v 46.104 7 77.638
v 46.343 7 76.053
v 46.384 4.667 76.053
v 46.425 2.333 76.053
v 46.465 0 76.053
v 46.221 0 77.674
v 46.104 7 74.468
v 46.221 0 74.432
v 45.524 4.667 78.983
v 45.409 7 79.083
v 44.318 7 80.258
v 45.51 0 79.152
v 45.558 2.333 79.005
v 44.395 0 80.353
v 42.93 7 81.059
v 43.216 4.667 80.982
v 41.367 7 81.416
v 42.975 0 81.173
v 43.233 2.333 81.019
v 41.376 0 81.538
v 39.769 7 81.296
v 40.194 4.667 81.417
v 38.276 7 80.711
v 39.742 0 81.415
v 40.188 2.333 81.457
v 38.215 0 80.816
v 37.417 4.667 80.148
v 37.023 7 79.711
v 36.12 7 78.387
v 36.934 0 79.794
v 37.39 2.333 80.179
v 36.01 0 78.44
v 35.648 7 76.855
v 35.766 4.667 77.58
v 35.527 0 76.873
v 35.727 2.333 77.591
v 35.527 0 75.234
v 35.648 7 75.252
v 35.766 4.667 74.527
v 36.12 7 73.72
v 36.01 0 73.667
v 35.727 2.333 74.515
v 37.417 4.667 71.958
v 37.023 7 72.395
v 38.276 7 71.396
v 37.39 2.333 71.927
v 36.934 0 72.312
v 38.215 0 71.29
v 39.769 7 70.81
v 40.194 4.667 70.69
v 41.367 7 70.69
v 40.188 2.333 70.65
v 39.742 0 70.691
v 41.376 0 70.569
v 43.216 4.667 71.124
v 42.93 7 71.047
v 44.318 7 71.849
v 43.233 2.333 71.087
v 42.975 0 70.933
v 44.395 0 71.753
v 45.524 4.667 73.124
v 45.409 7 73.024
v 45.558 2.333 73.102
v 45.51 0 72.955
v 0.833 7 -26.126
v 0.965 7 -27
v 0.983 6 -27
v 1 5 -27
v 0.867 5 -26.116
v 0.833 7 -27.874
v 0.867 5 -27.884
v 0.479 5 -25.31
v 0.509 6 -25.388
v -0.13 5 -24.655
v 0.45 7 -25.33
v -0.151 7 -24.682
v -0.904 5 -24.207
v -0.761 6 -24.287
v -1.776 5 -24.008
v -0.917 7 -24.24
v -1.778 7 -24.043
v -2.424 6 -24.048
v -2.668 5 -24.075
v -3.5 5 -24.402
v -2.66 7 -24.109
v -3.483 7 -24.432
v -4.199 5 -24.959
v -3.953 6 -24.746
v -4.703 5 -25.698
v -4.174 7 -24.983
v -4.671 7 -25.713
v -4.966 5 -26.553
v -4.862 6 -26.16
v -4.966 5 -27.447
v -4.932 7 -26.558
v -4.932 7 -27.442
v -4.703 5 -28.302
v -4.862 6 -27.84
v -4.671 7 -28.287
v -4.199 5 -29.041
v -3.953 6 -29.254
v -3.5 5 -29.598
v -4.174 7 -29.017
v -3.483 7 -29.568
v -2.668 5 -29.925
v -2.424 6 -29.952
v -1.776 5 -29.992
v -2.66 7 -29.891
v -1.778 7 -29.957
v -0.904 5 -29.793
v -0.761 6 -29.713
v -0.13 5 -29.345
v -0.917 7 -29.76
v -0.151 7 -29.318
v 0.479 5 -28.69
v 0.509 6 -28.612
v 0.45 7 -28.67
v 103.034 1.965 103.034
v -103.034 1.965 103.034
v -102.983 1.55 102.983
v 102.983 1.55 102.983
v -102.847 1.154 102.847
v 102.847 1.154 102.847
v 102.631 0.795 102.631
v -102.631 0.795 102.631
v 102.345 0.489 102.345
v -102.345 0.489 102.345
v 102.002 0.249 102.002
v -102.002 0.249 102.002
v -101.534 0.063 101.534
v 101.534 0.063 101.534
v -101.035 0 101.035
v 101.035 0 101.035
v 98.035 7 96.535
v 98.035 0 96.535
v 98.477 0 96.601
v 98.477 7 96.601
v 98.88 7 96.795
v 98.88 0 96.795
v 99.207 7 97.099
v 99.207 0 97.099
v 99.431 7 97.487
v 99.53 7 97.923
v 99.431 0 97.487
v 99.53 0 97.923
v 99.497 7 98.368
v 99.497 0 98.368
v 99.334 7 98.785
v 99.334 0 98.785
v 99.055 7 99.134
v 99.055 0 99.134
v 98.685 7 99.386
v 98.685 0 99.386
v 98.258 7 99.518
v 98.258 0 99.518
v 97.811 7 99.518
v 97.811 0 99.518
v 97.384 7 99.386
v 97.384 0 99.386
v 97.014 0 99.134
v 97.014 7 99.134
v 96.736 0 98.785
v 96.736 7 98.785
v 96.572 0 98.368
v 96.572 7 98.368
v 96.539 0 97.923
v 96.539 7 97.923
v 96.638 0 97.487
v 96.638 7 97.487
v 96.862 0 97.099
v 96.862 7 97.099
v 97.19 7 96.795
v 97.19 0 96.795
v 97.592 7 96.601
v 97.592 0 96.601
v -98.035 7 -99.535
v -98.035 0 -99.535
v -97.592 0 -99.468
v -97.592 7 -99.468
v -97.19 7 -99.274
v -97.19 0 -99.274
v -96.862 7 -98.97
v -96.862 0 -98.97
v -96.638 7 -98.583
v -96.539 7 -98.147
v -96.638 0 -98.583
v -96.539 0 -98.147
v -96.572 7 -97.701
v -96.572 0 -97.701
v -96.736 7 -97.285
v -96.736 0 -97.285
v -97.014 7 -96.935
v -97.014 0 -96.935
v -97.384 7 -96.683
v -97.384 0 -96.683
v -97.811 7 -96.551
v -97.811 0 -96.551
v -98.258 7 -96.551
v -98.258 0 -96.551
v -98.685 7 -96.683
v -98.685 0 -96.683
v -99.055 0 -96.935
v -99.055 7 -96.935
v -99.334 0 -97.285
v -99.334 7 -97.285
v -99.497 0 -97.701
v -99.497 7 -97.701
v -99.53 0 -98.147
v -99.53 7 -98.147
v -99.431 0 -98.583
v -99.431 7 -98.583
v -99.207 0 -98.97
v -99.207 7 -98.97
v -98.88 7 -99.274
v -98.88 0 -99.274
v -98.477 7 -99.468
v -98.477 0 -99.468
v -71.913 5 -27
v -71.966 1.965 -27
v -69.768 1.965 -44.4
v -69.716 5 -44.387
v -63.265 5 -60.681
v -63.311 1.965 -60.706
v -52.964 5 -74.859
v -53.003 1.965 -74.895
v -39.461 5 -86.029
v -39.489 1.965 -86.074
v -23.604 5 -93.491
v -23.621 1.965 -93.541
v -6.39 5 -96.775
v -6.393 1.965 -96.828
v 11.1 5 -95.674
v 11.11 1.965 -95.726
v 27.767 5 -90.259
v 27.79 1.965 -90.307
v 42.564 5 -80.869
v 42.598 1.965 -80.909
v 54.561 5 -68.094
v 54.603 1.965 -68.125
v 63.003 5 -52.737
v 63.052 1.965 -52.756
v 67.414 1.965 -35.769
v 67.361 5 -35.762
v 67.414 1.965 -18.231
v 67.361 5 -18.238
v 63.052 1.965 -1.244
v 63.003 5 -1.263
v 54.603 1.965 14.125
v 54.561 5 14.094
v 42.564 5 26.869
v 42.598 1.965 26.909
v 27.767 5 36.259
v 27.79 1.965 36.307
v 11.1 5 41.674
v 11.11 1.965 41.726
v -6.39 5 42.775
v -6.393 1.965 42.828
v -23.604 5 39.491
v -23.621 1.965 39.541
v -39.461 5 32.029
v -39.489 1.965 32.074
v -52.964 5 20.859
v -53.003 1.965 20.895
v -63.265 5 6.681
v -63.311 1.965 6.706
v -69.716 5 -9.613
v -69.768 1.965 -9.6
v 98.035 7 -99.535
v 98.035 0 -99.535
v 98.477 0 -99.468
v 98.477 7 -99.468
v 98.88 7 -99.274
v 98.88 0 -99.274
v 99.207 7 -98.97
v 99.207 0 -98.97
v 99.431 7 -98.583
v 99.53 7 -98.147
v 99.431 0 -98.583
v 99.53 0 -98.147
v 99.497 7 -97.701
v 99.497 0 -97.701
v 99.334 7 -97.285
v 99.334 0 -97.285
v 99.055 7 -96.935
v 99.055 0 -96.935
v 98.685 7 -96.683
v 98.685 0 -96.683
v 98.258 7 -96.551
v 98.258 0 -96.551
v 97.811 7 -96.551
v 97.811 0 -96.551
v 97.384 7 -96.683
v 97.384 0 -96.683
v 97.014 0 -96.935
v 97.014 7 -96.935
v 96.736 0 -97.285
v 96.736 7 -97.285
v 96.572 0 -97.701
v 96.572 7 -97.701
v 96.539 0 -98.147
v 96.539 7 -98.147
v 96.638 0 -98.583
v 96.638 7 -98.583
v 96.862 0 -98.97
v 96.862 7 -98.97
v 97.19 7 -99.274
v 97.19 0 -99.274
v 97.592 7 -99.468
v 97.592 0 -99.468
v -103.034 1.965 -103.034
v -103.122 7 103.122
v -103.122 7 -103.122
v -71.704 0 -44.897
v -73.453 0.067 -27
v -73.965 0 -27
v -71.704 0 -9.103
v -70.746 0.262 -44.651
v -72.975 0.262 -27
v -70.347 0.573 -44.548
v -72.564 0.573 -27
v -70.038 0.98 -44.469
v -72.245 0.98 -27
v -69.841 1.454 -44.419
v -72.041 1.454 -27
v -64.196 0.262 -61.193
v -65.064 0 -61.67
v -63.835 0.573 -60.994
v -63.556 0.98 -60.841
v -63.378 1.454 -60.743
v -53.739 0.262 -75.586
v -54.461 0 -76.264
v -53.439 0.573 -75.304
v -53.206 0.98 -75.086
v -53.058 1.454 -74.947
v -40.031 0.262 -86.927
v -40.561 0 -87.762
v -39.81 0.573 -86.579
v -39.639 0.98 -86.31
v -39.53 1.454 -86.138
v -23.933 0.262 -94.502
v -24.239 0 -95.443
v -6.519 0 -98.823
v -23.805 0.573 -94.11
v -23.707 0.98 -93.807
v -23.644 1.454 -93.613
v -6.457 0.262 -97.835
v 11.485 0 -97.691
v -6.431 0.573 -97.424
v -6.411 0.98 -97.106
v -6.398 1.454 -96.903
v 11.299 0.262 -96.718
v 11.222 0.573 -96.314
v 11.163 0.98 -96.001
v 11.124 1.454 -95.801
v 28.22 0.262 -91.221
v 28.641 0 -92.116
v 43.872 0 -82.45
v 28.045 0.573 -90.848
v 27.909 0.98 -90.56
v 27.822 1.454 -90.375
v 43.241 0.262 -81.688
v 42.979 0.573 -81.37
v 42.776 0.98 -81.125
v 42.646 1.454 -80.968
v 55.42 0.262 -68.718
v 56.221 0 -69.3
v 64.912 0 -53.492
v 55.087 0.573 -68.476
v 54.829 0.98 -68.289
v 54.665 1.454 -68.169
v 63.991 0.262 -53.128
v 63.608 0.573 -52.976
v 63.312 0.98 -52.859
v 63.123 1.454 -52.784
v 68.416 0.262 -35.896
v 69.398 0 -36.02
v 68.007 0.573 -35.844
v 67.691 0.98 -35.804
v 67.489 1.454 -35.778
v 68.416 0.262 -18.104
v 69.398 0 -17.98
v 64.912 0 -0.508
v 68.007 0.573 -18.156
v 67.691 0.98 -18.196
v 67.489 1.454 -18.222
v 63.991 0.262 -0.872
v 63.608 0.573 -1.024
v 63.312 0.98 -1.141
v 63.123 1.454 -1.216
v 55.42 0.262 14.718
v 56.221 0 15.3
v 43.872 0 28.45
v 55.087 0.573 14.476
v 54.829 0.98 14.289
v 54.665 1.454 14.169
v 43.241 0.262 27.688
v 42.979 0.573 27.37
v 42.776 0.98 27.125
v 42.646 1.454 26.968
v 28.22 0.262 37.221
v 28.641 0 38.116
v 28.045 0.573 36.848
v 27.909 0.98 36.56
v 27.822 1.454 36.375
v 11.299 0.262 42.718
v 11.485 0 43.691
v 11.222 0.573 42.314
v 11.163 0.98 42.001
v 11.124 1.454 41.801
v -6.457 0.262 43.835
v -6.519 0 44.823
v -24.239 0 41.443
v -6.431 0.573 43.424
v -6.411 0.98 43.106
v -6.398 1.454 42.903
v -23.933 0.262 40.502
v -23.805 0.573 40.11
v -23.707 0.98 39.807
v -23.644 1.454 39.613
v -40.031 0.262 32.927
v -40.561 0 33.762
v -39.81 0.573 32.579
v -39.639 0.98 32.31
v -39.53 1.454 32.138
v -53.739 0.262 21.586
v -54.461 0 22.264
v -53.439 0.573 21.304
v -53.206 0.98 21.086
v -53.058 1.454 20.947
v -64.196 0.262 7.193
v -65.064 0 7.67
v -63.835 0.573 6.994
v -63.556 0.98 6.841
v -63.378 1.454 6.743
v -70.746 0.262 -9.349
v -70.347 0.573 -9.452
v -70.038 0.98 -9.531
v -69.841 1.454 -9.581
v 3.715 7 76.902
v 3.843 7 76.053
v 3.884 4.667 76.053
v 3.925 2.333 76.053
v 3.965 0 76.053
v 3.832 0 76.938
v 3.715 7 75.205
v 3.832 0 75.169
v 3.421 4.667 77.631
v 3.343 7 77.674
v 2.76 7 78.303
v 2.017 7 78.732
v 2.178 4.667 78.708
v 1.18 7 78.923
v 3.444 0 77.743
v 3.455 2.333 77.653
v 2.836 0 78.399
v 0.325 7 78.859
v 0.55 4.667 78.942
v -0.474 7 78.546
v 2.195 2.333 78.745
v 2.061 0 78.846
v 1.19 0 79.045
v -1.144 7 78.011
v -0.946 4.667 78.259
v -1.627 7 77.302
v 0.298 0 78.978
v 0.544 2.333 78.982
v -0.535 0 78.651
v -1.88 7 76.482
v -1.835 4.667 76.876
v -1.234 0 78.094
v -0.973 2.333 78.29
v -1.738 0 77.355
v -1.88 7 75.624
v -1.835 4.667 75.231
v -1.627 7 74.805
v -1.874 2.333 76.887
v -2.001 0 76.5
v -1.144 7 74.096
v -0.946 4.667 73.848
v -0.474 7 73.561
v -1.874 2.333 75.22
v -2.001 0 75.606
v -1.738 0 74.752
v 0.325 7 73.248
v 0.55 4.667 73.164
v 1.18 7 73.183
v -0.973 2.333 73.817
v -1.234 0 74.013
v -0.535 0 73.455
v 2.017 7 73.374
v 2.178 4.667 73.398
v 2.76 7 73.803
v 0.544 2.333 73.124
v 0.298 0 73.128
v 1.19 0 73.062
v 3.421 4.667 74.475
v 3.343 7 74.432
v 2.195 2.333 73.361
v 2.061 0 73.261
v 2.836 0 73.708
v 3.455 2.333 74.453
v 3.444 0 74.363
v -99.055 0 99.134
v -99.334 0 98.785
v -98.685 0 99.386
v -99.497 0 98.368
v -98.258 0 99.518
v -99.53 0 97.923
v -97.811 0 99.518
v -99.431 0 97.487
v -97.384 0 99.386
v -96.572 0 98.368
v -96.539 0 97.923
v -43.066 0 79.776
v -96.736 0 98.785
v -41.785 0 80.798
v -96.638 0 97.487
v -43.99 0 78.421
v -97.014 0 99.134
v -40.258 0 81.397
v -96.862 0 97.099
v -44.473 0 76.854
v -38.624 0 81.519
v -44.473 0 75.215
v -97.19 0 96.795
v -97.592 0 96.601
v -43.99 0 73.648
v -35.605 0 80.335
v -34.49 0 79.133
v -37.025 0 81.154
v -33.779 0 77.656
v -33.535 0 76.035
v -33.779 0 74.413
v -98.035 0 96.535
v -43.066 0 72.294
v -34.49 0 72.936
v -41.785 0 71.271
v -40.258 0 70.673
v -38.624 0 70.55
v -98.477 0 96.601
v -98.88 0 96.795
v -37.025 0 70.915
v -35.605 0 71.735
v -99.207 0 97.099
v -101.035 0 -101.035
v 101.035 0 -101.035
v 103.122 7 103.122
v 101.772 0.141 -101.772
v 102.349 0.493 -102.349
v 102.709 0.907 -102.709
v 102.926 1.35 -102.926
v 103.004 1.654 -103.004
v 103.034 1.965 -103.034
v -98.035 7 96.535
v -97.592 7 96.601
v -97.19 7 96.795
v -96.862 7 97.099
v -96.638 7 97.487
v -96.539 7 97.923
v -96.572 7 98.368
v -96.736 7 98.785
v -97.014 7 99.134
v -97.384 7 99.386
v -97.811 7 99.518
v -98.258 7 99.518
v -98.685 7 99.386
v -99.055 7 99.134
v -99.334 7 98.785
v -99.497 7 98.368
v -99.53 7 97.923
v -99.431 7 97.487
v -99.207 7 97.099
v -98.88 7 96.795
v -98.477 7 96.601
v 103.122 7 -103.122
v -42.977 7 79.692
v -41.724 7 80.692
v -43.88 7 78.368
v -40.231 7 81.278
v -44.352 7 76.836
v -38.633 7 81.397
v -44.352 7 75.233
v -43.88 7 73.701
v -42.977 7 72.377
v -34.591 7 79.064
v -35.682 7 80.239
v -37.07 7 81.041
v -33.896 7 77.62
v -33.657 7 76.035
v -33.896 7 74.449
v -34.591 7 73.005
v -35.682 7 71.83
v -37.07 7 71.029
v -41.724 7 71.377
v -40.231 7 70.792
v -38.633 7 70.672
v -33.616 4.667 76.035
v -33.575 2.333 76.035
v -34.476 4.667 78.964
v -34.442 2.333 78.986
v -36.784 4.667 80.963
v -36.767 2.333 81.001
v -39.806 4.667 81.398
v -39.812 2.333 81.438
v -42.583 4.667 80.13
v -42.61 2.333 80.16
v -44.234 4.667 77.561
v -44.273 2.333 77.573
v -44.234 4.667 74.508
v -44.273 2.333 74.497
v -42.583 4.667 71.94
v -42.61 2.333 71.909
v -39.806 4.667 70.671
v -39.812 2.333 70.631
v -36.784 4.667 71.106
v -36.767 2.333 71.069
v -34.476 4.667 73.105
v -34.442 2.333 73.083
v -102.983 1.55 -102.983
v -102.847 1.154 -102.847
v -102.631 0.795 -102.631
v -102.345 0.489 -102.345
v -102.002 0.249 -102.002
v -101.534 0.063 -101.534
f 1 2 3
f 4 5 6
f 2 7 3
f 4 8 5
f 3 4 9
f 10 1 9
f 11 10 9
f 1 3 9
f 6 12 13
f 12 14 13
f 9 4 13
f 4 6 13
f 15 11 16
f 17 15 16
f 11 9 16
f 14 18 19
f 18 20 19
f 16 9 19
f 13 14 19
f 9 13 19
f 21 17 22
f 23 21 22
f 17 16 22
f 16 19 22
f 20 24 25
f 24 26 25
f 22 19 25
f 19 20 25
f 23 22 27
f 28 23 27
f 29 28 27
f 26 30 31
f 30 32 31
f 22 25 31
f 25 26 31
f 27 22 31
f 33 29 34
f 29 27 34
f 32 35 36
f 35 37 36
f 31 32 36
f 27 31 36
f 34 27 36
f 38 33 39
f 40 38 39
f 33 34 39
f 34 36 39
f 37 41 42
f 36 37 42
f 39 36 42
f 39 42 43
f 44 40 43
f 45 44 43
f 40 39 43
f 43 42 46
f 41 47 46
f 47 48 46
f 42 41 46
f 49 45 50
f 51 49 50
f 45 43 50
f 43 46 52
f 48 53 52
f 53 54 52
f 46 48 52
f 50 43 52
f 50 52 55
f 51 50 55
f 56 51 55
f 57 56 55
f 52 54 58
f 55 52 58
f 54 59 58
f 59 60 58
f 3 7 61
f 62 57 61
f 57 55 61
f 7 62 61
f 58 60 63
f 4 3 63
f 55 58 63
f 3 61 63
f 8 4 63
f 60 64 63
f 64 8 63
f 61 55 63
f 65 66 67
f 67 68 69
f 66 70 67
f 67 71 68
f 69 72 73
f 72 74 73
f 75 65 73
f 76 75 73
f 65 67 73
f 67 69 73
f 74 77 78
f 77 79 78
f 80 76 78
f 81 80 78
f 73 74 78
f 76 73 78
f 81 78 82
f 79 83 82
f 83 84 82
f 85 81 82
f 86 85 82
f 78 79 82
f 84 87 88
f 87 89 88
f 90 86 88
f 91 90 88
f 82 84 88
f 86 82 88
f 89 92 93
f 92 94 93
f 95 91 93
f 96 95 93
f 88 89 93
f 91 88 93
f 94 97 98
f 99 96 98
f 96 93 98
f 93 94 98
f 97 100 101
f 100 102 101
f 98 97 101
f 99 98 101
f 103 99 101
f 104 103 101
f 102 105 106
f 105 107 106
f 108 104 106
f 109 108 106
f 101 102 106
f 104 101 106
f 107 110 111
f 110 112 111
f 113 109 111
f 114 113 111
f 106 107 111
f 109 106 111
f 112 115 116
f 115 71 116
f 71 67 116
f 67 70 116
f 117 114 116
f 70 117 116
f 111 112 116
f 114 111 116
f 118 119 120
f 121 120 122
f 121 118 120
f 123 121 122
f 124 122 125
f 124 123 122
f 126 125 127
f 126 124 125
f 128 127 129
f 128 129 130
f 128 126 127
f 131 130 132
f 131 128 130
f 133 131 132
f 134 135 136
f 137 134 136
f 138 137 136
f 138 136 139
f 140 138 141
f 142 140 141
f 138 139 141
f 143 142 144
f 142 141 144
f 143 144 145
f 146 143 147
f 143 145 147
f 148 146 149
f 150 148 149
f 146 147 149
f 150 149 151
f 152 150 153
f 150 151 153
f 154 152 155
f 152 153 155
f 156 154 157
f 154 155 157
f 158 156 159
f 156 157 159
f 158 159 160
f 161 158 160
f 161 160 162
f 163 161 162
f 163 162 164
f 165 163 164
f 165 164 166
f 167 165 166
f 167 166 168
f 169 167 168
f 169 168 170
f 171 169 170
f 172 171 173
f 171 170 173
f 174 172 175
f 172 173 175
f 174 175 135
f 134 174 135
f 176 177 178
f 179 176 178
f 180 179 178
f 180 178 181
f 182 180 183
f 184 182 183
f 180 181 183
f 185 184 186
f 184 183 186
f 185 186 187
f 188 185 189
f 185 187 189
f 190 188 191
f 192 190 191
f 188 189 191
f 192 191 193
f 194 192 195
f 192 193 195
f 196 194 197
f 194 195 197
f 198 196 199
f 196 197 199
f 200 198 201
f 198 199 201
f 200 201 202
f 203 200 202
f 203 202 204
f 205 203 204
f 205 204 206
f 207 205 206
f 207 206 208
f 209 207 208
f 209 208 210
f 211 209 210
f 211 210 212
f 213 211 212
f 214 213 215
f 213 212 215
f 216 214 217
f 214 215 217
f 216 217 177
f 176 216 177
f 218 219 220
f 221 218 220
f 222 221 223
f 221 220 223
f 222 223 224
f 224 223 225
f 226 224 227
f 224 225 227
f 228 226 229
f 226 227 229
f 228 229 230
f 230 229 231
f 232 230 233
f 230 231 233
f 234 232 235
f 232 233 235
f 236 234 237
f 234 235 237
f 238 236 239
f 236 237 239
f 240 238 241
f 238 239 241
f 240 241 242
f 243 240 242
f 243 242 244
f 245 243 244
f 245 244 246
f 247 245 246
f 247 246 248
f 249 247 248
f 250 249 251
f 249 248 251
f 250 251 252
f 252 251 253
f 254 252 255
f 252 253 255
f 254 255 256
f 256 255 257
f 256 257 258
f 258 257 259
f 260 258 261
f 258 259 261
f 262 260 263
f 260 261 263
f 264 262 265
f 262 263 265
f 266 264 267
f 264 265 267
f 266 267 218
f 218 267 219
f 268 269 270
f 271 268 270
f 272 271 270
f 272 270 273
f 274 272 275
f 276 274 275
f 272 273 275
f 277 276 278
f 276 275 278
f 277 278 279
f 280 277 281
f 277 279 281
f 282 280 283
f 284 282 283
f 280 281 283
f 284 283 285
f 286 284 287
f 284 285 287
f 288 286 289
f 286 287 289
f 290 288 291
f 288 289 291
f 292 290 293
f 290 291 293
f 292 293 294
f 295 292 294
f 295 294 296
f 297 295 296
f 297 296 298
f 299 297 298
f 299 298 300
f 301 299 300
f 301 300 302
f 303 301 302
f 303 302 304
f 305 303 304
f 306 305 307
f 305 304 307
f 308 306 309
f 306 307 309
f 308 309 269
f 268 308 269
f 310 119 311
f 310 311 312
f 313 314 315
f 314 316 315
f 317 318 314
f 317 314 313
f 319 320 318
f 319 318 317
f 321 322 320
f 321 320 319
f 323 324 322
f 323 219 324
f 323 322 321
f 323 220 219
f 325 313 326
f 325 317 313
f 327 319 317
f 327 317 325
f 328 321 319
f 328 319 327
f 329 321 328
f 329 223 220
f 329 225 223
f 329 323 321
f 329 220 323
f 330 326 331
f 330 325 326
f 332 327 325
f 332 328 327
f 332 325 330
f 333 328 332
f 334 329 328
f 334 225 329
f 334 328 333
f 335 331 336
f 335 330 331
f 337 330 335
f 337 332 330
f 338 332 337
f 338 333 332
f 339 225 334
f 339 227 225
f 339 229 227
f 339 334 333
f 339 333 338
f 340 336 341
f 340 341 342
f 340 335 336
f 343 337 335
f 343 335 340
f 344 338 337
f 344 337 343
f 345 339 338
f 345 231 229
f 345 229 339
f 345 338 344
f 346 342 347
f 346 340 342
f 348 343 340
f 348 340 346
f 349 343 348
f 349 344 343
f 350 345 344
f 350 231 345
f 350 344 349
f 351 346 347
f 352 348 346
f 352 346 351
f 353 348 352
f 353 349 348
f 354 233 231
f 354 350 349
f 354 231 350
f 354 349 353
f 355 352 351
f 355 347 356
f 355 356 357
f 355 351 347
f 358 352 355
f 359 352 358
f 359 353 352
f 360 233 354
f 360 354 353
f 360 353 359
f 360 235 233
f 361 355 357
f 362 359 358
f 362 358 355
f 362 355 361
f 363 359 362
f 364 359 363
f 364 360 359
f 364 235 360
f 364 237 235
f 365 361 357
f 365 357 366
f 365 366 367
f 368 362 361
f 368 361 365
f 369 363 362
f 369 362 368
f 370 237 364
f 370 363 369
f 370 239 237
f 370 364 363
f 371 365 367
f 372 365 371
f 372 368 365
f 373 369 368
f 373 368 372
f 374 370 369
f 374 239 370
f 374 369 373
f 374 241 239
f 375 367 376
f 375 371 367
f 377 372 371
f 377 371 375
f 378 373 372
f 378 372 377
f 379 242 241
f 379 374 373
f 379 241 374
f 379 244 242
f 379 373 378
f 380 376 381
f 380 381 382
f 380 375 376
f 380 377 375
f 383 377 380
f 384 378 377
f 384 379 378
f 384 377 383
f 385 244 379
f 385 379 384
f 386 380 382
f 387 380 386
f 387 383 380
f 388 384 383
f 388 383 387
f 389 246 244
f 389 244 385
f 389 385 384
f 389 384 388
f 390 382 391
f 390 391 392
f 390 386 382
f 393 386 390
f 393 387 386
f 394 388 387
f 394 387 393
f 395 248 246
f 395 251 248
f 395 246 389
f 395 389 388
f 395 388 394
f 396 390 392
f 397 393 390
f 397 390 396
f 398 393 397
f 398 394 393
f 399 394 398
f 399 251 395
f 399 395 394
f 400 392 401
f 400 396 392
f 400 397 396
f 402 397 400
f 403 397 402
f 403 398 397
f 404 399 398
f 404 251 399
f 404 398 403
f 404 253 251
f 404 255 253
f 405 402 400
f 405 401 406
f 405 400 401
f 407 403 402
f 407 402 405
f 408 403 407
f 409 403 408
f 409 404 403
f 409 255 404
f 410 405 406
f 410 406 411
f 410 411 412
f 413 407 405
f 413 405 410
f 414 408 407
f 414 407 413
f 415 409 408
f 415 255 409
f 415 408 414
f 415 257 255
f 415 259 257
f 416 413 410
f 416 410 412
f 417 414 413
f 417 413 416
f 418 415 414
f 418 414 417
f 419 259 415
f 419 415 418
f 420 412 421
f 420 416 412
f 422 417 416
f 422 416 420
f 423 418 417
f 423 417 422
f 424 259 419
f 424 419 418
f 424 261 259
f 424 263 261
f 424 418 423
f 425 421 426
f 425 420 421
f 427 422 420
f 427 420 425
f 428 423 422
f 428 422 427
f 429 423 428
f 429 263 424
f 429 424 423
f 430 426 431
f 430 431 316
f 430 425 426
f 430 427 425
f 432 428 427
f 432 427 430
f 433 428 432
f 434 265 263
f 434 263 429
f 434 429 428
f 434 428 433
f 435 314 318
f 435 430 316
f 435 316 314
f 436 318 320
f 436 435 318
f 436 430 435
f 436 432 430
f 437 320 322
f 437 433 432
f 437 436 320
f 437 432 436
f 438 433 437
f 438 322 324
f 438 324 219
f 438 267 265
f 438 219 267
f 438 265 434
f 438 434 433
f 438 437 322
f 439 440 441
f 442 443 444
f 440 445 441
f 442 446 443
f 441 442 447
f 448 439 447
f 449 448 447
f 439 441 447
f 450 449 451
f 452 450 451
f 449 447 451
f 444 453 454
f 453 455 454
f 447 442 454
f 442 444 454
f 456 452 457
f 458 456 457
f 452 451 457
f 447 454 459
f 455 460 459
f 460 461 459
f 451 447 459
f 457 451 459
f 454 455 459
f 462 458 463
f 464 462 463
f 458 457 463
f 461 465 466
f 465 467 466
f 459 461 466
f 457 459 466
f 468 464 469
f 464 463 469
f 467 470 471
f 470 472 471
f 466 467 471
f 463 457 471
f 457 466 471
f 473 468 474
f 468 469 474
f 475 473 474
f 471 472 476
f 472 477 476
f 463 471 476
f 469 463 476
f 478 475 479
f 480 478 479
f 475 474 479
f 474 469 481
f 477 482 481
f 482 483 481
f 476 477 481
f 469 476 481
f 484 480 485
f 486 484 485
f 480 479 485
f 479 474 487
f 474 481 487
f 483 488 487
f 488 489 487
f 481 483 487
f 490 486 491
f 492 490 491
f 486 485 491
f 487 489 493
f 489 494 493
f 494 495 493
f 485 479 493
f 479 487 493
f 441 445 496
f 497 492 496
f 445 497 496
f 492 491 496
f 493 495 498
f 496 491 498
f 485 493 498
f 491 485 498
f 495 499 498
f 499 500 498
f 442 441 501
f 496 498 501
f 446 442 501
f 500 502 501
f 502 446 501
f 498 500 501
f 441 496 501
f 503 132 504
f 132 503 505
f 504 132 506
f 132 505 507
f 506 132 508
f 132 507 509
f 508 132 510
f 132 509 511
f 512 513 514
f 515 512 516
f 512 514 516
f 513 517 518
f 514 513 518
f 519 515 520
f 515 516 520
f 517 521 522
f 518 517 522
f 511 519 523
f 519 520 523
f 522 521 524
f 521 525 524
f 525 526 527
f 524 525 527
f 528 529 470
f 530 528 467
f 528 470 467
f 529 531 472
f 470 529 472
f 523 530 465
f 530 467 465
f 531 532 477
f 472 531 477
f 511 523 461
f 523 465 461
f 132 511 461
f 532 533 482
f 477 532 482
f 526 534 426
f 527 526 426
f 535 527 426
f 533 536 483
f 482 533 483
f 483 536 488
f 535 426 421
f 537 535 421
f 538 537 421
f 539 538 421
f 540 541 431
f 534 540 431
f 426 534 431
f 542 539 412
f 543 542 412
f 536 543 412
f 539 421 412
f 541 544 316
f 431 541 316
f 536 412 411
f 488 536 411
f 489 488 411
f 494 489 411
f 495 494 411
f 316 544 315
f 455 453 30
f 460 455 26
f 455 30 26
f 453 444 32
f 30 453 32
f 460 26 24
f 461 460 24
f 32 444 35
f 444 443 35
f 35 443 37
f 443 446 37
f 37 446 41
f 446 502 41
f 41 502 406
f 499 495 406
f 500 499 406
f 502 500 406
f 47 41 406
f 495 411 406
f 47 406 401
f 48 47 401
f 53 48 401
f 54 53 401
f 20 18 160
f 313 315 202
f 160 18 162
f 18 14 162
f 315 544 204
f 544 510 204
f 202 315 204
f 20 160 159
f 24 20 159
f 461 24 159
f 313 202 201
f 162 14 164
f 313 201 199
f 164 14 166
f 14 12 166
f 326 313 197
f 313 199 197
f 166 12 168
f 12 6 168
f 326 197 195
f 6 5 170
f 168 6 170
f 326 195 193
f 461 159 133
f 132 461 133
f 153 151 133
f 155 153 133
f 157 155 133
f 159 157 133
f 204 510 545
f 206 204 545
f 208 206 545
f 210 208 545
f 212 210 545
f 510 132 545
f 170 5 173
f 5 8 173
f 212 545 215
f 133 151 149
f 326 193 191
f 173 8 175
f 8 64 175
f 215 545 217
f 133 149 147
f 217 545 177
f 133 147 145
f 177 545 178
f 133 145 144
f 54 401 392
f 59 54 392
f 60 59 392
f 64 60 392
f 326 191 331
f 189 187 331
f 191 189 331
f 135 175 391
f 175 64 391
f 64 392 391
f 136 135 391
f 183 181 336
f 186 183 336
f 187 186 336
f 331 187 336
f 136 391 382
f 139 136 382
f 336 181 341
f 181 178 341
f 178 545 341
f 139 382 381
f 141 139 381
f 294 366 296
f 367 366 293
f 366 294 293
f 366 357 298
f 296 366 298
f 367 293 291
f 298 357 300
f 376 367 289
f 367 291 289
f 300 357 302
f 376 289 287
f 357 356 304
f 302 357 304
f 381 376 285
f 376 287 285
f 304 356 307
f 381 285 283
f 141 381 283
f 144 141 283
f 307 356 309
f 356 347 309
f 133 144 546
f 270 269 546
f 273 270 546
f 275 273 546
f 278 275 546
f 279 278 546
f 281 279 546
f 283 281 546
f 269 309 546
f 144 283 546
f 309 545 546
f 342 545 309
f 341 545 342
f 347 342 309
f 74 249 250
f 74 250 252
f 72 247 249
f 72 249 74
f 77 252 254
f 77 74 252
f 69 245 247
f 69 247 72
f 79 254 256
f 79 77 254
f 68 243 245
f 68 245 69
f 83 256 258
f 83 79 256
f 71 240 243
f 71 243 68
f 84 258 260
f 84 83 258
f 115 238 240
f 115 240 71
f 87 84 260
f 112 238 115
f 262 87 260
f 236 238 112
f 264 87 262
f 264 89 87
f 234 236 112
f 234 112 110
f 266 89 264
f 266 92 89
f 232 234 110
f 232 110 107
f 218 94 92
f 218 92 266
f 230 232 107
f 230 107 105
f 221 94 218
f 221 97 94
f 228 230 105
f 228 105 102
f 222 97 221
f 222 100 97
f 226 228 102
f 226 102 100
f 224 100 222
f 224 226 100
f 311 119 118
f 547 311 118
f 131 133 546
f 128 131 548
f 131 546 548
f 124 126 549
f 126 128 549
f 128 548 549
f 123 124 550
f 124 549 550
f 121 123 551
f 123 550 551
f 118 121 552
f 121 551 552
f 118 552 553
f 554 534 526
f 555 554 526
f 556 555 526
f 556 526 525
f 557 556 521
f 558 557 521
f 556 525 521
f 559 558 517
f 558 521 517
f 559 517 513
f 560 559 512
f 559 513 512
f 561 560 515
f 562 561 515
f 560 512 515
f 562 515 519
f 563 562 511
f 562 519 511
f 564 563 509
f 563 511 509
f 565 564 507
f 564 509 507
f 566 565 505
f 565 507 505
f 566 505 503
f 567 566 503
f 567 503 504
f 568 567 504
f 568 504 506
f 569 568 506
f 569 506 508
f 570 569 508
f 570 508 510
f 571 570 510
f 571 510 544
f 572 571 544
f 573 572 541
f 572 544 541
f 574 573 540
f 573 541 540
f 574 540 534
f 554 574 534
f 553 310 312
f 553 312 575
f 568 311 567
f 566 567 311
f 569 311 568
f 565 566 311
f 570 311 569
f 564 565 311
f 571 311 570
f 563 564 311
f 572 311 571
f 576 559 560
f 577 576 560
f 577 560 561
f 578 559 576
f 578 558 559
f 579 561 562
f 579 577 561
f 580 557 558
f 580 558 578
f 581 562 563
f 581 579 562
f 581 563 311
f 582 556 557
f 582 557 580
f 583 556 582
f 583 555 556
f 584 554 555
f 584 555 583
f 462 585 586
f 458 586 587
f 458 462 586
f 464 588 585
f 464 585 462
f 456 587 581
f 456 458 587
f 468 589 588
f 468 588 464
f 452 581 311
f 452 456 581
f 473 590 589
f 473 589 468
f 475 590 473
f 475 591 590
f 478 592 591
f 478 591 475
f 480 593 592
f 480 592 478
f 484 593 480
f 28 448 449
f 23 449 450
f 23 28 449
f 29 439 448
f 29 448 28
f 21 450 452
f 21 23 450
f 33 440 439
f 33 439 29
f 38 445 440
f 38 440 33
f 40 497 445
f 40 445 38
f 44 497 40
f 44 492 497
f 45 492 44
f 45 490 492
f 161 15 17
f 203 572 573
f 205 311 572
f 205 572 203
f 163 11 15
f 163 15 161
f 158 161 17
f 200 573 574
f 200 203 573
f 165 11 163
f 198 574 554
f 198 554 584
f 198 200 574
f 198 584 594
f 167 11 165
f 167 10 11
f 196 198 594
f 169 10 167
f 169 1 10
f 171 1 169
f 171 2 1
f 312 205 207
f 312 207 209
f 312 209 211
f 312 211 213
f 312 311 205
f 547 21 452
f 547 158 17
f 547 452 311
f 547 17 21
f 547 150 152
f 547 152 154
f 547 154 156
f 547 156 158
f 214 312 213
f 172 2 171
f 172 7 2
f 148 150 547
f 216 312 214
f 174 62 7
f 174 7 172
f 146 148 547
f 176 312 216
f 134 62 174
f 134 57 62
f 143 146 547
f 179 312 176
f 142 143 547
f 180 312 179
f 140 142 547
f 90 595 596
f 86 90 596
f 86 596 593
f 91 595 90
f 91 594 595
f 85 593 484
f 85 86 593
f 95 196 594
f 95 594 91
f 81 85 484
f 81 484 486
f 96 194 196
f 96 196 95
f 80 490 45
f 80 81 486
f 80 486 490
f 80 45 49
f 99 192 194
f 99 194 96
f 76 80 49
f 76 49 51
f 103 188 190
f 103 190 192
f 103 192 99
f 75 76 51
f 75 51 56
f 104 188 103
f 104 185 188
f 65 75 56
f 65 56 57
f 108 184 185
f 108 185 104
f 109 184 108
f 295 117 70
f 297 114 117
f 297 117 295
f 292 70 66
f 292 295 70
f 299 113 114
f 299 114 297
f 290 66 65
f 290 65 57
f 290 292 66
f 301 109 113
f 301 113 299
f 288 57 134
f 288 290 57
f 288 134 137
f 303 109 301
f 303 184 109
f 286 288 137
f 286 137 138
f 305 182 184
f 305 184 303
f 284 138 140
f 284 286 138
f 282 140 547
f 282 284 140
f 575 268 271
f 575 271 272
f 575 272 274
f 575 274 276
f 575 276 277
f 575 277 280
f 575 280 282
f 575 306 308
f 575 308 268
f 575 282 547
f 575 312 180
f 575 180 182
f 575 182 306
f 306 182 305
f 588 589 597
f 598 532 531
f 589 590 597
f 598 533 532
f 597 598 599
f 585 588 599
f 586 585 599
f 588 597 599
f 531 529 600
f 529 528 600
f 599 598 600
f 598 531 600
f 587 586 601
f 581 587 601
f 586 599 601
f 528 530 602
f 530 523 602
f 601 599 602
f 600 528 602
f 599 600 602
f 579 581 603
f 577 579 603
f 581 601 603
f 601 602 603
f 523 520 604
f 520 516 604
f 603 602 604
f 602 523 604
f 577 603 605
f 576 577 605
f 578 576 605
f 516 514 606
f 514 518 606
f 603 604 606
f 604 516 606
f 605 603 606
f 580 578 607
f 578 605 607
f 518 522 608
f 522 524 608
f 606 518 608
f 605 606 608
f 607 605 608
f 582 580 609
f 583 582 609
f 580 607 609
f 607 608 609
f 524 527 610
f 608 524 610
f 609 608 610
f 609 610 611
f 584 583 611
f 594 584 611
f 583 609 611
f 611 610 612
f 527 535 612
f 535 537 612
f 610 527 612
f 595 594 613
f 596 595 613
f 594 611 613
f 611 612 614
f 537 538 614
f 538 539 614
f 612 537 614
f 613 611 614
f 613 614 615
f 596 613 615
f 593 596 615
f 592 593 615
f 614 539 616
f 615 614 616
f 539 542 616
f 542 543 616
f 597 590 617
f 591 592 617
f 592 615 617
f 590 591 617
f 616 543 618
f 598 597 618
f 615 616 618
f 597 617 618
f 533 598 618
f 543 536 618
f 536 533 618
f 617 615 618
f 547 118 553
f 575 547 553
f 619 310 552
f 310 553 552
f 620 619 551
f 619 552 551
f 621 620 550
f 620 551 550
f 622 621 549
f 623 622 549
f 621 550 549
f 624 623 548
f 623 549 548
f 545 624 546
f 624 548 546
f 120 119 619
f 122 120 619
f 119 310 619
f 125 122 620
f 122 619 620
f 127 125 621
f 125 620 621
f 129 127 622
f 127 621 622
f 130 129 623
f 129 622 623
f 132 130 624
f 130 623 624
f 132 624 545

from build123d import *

# Parameters (mm, degrees)
SKETCH1_W                  = 206
SKETCH1_H                  = 206
MAINBOSS_DEPTH             = 7
MAINBOSS_DRAFT             = -1
SKETCH4_R                  = 70
TRAYCUT_DEPTH              = 5
TRAYCUT_DRAFT              = -1
SKETCH5_R                  = 3
TRAYHOLE_DEPTH             = 7
TRAYHOLE_DRAFT             = -1
MAINFILLET_R               = 2
SKETCH6_R                  = 3
SHAFTHOLES_DEPTH           = 7
SHAFTHOLES_DRAFT           = -1
SKETCH6_R_2                = 5.5
SHAFTHOLES_PROFILE_2_DEPTH = 7
SHAFTHOLES_PROFILE_2_DRAFT = -1
SHAFTHOLES_PROFILE_3_DEPTH = 7
SHAFTHOLES_PROFILE_3_DRAFT = -1
SKETCH7_R                  = 1.5
BACKLEFTHOLDER_DEPTH       = 7
SKETCH8_R                  = 1.5
BACKRIGHTHOLDER_DEPTH      = 7
SKETCH9_R                  = 1.5
FRONTRIGHTHOLDER_DEPTH     = 7
SKETCH10_R                 = 1.5
FRONTLEFTHOLDER_DEPTH      = 7


with BuildPart() as part:
    # Sketch1 → MainBoss (with draft: the straight prism first)
    with BuildSketch(Plane(origin=(0, 0, 0), x_dir=(1, 0, 0), z_dir=(0, 1, 0))):
        Rectangle(SKETCH1_W, SKETCH1_H)
    extrude(amount=MAINBOSS_DEPTH)
    # MainBoss: the draft: its side faces are tilted about the plane it starts from
    mainboss_sides = [part.faces().sort_by_distance(p)[0] for p in [
        (-103, 3.5, 0),
        (0, 3.5, 103),
        (103, 3.5, 0),
        (0, 3.5, -103),
    ]]
    draft(mainboss_sides, Plane(origin=(0, 0, 0), x_dir=(1, 0, 0), z_dir=(0, 1, 0)), MAINBOSS_DRAFT)


with BuildPart() as traycut_tool:
    # Sketch4 → TrayCut (with draft: the straight prism first)
    with BuildSketch(Plane(origin=(0, 0, 0), x_dir=(-1, 0, 0), z_dir=(0, -1, 0))):
        with Locations((2, 27)):
            Circle(SKETCH4_R)
    extrude(amount=-TRAYCUT_DEPTH)
    # TrayCut: the draft: its side faces are tilted about the plane it starts from
    traycut_sides = [traycut_tool.faces().sort_by_distance(p)[0] for p in [
        (68, 2.5, -27),
    ]]
    draft(traycut_sides, Plane(origin=(0, 0, 0), x_dir=(-1, 0, 0), z_dir=(0, -1, 0)), TRAYCUT_DRAFT)


with BuildPart() as part_1:
    add(part.part)

    # TrayCut: cut by traycut_tool
    add(traycut_tool.part, mode=Mode.SUBTRACT)


with BuildPart() as trayhole_tool:
    # Sketch5 → TrayHole (with draft: the straight prism first)
    with BuildSketch(Plane.XZ.offset(-5)):
        with Locations((-2, -27)):
            Circle(SKETCH5_R)
    extrude(amount=-TRAYHOLE_DEPTH)
    # TrayHole: the draft: its side faces are tilted about the plane it starts from
    trayhole_sides = [trayhole_tool.faces().sort_by_distance(p)[0] for p in [
        (-5, 8.5, -27),
    ]]
    draft(trayhole_sides, Plane.XZ.offset(-5), TRAYHOLE_DRAFT)


with BuildPart() as part_2:
    add(part_1.part)

    # TrayHole: cut by trayhole_tool
    add(trayhole_tool.part, mode=Mode.SUBTRACT)

    # MainFillet
    mainfillet_edges = [part_2.edges().sort_by_distance(p)[0] for p in [
        (68, 0, -27),
        (-103, 0, 0),
        (0, 0, 103),
        (103, 0, 0),
        (0, 0, -103),
    ]]
    fillet(mainfillet_edges, radius=MAINFILLET_R)


with BuildPart() as shaftholes_tool:
    # Sketch6 → ShaftHoles (with draft: the straight prism first)
    with BuildSketch(Plane.XZ):
        with Locations((0.965394526, 76.05325216)):
            Circle(SKETCH6_R)
    extrude(amount=-SHAFTHOLES_DEPTH)
    # ShaftHoles: the draft: its side faces are tilted about the plane it starts from
    shaftholes_sides = [shaftholes_tool.faces().sort_by_distance(p)[0] for p in [
        (-2.034605474, 3.5, 76.05325216),
    ]]
    draft(shaftholes_sides, Plane.XZ, SHAFTHOLES_DRAFT)


with BuildPart() as part_3:
    add(part_2.part)

    # ShaftHoles: cut by shaftholes_tool
    add(shaftholes_tool.part, mode=Mode.SUBTRACT)


with BuildPart() as shaftholes_profile_2_tool:
    # Sketch6 → ShaftHoles profile 2 (with draft: the straight prism first)
    with BuildSketch(Plane.XZ):
        with Locations((-39.034601128, 76.034605474)):
            Circle(SKETCH6_R_2)
    extrude(amount=-SHAFTHOLES_PROFILE_2_DEPTH)
    # ShaftHoles profile 2: the draft: its side faces are tilted about the plane it starts from
    shaftholes_profile_2_sides = [shaftholes_profile_2_tool.faces().sort_by_distance(p)[0] for p in [
        (-44.534601128, 3.5, 76.034605474),
    ]]
    draft(shaftholes_profile_2_sides, Plane.XZ, SHAFTHOLES_PROFILE_2_DRAFT)


with BuildPart() as part_4:
    add(part_3.part)

    # ShaftHoles profile 2: cut by shaftholes_profile_2_tool
    add(shaftholes_profile_2_tool.part, mode=Mode.SUBTRACT)


with BuildPart() as shaftholes_profile_3_tool:
    # Sketch6 → ShaftHoles profile 3 (with draft: the straight prism first)
    with BuildSketch(Plane.XZ):
        with Locations((40.965394526, 76.05325216)):
            Circle(SKETCH6_R_2)
    extrude(amount=-SHAFTHOLES_PROFILE_3_DEPTH)
    # ShaftHoles profile 3: the draft: its side faces are tilted about the plane it starts from
    shaftholes_profile_3_sides = [shaftholes_profile_3_tool.faces().sort_by_distance(p)[0] for p in [
        (35.465394526, 3.5, 76.05325216),
    ]]
    draft(shaftholes_profile_3_sides, Plane.XZ, SHAFTHOLES_PROFILE_3_DRAFT)


with BuildPart() as part_5:
    add(part_4.part)

    # ShaftHoles profile 3: cut by shaftholes_profile_3_tool
    add(shaftholes_profile_3_tool.part, mode=Mode.SUBTRACT)

    # Sketch7 → BackLeftHolder (cut)
    with BuildSketch(Plane(origin=(0, 0, 0), x_dir=(-1, 0, 0), z_dir=(0, -1, 0))):
        with Locations(Location((98.034605474, -98.034605474, 0), (0, 0, 90))):
            Circle(SKETCH7_R)
    extrude(amount=-BACKLEFTHOLDER_DEPTH, mode=Mode.SUBTRACT)

    # Sketch8 → BackRightHolder (cut)
    with BuildSketch(Plane(origin=(0, 0, 0), x_dir=(-1, 0, 0), z_dir=(0, -1, 0))):
        with Locations(Location((-98.034605474, -98.034605474, 0), (0, 0, 90))):
            Circle(SKETCH8_R)
    extrude(amount=-BACKRIGHTHOLDER_DEPTH, mode=Mode.SUBTRACT)

    # Sketch9 → FrontRightHolder (cut)
    with BuildSketch(Plane(origin=(0, 0, 0), x_dir=(-1, 0, 0), z_dir=(0, -1, 0))):
        with Locations(Location((-98.034605474, 98.034605474, 0), (0, 0, 90))):
            Circle(SKETCH9_R)
    extrude(amount=-FRONTRIGHTHOLDER_DEPTH, mode=Mode.SUBTRACT)

    # Sketch10 → FrontLeftHolder (cut)
    with BuildSketch(Plane(origin=(0, 0, 0), x_dir=(-1, 0, 0), z_dir=(0, -1, 0))):
        with Locations(Location((98.034605474, 98.034605474, 0), (0, 0, 90))):
            Circle(SKETCH10_R)
    extrude(amount=-FRONTLEFTHOLDER_DEPTH, mode=Mode.SUBTRACT)


solid = part_5.part
